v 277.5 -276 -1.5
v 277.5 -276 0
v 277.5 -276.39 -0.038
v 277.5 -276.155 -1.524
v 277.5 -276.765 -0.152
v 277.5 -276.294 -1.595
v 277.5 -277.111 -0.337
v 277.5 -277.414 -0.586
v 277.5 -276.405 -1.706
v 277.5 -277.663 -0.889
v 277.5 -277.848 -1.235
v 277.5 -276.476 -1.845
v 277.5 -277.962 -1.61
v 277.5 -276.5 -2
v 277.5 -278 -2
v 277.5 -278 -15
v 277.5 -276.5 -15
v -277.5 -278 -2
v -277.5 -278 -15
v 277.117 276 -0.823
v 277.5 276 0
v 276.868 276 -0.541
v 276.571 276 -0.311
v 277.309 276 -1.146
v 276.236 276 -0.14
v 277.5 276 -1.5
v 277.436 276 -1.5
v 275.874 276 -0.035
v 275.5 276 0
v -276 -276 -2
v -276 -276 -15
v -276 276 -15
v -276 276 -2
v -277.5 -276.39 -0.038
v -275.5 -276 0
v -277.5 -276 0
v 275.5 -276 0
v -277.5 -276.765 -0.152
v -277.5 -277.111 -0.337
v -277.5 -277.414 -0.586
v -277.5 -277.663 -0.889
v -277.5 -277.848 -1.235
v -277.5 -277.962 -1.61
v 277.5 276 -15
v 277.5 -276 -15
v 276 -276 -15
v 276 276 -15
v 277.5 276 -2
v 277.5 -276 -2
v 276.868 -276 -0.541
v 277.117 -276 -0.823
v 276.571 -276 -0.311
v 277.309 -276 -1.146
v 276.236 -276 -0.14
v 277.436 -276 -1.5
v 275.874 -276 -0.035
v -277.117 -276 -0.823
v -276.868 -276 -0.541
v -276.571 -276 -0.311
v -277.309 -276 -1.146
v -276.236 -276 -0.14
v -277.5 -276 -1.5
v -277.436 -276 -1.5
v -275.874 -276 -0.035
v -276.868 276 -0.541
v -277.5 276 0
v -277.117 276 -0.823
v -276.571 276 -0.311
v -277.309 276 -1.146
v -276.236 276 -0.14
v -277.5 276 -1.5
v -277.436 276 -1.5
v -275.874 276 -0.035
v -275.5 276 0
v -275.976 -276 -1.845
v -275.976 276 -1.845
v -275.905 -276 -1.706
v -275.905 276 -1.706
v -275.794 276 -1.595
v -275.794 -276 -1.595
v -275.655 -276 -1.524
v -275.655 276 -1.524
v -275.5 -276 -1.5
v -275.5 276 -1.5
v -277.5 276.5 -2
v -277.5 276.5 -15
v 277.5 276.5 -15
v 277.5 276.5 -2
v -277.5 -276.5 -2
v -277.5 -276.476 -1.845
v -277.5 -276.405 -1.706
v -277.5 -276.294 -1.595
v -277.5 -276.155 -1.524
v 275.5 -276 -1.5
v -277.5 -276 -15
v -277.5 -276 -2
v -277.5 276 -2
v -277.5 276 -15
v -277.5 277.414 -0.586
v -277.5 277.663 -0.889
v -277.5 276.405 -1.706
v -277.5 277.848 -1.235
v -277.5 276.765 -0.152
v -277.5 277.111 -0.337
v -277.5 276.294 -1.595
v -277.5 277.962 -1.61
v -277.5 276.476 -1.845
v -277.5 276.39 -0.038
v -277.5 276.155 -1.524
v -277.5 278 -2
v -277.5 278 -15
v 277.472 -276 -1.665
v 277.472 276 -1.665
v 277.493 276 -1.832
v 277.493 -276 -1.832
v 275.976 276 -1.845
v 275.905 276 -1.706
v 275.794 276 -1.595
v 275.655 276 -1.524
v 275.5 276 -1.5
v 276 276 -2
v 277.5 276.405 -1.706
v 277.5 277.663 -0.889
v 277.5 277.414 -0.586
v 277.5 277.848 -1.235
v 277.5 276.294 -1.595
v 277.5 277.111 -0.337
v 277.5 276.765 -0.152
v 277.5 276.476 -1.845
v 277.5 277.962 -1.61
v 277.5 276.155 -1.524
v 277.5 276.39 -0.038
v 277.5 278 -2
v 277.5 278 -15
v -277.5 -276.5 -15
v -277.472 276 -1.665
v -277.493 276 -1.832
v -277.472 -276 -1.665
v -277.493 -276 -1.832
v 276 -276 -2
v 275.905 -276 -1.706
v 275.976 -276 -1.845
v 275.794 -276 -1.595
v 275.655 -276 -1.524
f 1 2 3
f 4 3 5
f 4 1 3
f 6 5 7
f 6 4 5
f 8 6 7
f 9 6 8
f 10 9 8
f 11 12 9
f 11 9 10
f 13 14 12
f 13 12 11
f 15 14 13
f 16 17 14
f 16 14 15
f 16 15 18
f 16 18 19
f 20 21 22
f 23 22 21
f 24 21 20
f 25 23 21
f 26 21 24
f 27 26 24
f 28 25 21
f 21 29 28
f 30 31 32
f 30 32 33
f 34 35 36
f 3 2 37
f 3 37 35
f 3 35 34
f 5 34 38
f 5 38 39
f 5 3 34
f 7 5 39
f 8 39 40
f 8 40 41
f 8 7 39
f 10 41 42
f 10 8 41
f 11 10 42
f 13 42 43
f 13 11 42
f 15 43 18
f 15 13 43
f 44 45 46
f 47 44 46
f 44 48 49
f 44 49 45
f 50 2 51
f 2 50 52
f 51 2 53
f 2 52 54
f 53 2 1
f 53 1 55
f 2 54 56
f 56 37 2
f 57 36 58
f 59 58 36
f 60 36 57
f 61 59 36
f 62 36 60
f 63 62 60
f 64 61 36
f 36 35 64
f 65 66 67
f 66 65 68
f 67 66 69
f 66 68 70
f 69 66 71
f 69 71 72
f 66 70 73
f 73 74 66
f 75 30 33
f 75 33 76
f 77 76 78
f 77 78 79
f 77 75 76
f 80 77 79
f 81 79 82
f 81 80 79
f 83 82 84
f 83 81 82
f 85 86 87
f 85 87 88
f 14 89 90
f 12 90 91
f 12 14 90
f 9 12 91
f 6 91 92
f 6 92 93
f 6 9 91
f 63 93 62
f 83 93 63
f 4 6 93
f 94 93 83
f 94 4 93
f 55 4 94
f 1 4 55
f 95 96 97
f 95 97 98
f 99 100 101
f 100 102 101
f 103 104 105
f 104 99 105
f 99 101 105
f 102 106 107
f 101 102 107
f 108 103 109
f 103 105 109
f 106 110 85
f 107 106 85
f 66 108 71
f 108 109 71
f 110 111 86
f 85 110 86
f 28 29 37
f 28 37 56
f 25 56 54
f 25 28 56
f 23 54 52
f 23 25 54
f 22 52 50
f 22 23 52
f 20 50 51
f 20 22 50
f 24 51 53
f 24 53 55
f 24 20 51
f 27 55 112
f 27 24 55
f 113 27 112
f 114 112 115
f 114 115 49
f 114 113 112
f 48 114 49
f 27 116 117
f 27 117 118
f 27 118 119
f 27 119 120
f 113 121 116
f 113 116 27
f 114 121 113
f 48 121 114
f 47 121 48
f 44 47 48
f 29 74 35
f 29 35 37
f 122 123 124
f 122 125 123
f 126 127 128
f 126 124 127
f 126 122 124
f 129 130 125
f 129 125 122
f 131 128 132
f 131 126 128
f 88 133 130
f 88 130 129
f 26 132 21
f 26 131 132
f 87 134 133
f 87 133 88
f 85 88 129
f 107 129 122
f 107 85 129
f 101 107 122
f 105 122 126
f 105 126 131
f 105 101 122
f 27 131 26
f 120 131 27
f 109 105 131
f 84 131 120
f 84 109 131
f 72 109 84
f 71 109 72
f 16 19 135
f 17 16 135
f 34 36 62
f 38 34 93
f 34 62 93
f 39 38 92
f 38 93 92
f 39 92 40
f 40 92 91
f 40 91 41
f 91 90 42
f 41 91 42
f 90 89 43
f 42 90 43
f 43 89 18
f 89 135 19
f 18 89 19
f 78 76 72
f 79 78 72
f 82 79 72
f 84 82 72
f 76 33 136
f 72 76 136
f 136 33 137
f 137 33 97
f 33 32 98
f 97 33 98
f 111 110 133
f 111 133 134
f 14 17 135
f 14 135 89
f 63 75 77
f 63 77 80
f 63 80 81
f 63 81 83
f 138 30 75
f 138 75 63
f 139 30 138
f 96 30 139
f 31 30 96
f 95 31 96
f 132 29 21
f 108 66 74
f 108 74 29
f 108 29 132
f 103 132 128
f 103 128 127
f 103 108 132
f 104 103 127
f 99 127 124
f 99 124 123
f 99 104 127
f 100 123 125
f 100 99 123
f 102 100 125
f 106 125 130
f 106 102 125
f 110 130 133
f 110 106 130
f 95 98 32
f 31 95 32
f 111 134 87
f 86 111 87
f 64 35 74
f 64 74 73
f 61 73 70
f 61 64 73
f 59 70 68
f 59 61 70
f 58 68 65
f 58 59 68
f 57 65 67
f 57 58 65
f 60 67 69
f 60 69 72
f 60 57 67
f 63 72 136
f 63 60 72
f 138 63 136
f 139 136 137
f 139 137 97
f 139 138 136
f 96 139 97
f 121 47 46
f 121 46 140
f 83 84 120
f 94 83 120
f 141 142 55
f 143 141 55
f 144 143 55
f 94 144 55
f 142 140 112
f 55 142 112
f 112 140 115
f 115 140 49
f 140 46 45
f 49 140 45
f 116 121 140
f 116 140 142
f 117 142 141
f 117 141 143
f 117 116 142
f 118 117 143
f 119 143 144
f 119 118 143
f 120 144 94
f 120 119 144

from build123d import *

# Parameters (mm, degrees)
SKETCH_2_W                         = 555
SKETCH_2_H                         = 556
SM_BASE_FLANGE_1_DEPTH             = 1.5
SM_EDGE_FLANGE_2_STRIP_W           = 7
SM_EDGE_FLANGE_2_STRIP_H           = 1.5
SM_EDGE_FLANGE_2_STRIP_CUT_DEPTH   = 555
SM_EDGE_FLANGE_2_STRIP_2_W         = 7
SM_EDGE_FLANGE_2_STRIP_2_H         = 1.5
SM_EDGE_FLANGE_2_STRIP_CUT_2_DEPTH = 555
SM_EDGE_FLANGE_2_DEPTH             = 555
SM_EDGE_FLANGE_2_BEND_DEPTH        = 555
SM_EDGE_FLANGE_3_STRIP_W           = 7
SM_EDGE_FLANGE_3_STRIP_H           = 1.5
SM_EDGE_FLANGE_3_STRIP_CUT_DEPTH   = 552
SM_EDGE_FLANGE_3_STRIP_2_W         = 7
SM_EDGE_FLANGE_3_STRIP_2_H         = 1.5
SM_EDGE_FLANGE_3_STRIP_CUT_2_DEPTH = 552
SM_EDGE_FLANGE_3_DEPTH             = 552
SM_EDGE_FLANGE_3_BEND_DEPTH        = 552


# Sheet-metal steps are written as plain solids
with BuildPart() as part:
    # Sketch 2 → 基体-法兰1 (new body)
    with BuildSketch(Plane.XY):
        Rectangle(SKETCH_2_W, SKETCH_2_H)
    extrude(amount=-SM_BASE_FLANGE_1_DEPTH)

    # 边线-法兰2 strip (across the edge) → 边线-法兰2 strip cut (cut)
    with BuildSketch(Plane(origin=(-277.5, 278, -1.5), x_dir=(0, -1, 0), z_dir=(1, 0, 0))):
        with Locations((-1.5, -0.75)):
            Rectangle(SM_EDGE_FLANGE_2_STRIP_W, SM_EDGE_FLANGE_2_STRIP_H)
    extrude(amount=SM_EDGE_FLANGE_2_STRIP_CUT_DEPTH, mode=Mode.SUBTRACT)

    # 边线-法兰2 strip 2 (across the edge) → 边线-法兰2 strip cut 2 (cut)
    with BuildSketch(Plane(origin=(277.5, -278, -1.5), x_dir=(0, 1, 0), z_dir=(-1, 0, 0))):
        with Locations((-1.5, -0.75)):
            Rectangle(SM_EDGE_FLANGE_2_STRIP_2_W, SM_EDGE_FLANGE_2_STRIP_2_H)
    extrude(amount=SM_EDGE_FLANGE_2_STRIP_CUT_2_DEPTH, mode=Mode.SUBTRACT)

    # 边线-法兰2 section (across the edge) → 边线-法兰2 (add)
    with BuildSketch(Plane(origin=(-277.5, 278, -1.5), x_dir=(0, -1, 0), z_dir=(1, 0, 0))):
        with BuildLine():
            Line((0, 0.5), (0, 13.5))
            Line((0, 13.5), (1.5, 13.5))
            Line((1.5, 13.5), (1.5, 0.5))
            ThreePointArc((1.5, 0.5), (1.646446609, 0.146446609), (2, 0))
            Line((2, 0), (2, -1.5))
            ThreePointArc((2, -1.5), (0.585786438, -0.914213562), (0, 0.5))
        make_face()
    extrude(amount=SM_EDGE_FLANGE_2_DEPTH)

    # 边线-法兰2 section 2 (across the edge) → 边线-法兰2 bend (add)
    with BuildSketch(Plane(origin=(277.5, -278, -1.5), x_dir=(0, 1, 0), z_dir=(-1, 0, 0))):
        with BuildLine():
            Line((0, 0.5), (0, 13.5))
            Line((0, 13.5), (1.5, 13.5))
            Line((1.5, 13.5), (1.5, 0.5))
            ThreePointArc((1.5, 0.5), (1.646446609, 0.146446609), (2, 0))
            Line((2, 0), (2, -1.5))
            ThreePointArc((2, -1.5), (0.585786438, -0.914213562), (0, 0.5))
        make_face()
    extrude(amount=SM_EDGE_FLANGE_2_BEND_DEPTH)

    # 边线-法兰3 strip (across the edge) → 边线-法兰3 strip cut (cut)
    with BuildSketch(Plane(origin=(-277.5, -276, -1.5), x_dir=(1, 0, 0), z_dir=(0, 1, 0))):
        with Locations((-1.5, -0.75)):
            Rectangle(SM_EDGE_FLANGE_3_STRIP_W, SM_EDGE_FLANGE_3_STRIP_H)
    extrude(amount=SM_EDGE_FLANGE_3_STRIP_CUT_DEPTH, mode=Mode.SUBTRACT)

    # 边线-法兰3 strip 2 (across the edge) → 边线-法兰3 strip cut 2 (cut)
    with BuildSketch(Plane(origin=(277.5, 276, -1.5), x_dir=(-1, 0, 0), z_dir=(0, -1, 0))):
        with Locations((-1.5, -0.75)):
            Rectangle(SM_EDGE_FLANGE_3_STRIP_2_W, SM_EDGE_FLANGE_3_STRIP_2_H)
    extrude(amount=SM_EDGE_FLANGE_3_STRIP_CUT_2_DEPTH, mode=Mode.SUBTRACT)

    # 边线-法兰3 section (across the edge) → 边线-法兰3 (add)
    with BuildSketch(Plane(origin=(-277.5, -276, -1.5), x_dir=(1, 0, 0), z_dir=(0, 1, 0))):
        with BuildLine():
            Line((0, 0.5), (0, 13.5))
            Line((0, 13.5), (1.5, 13.5))
            Line((1.5, 13.5), (1.5, 0.5))
            ThreePointArc((1.5, 0.5), (1.646446609, 0.146446609), (2, 0))
            Line((2, 0), (2, -1.5))
            ThreePointArc((2, -1.5), (0.585786438, -0.914213562), (0, 0.5))
        make_face()
    extrude(amount=SM_EDGE_FLANGE_3_DEPTH)

    # 边线-法兰3 section 2 (across the edge) → 边线-法兰3 bend (add)
    with BuildSketch(Plane(origin=(277.5, 276, -1.5), x_dir=(-1, 0, 0), z_dir=(0, -1, 0))):
        with BuildLine():
            Line((0, 0.5), (0, 13.5))
            Line((0, 13.5), (1.5, 13.5))
            Line((1.5, 13.5), (1.5, 0.5))
            ThreePointArc((1.5, 0.5), (1.646446609, 0.146446609), (2, 0))
            Line((2, 0), (2, -1.5))
            ThreePointArc((2, -1.5), (0.585786438, -0.914213562), (0, 0.5))
        make_face()
    extrude(amount=SM_EDGE_FLANGE_3_BEND_DEPTH)


solid = part.part
